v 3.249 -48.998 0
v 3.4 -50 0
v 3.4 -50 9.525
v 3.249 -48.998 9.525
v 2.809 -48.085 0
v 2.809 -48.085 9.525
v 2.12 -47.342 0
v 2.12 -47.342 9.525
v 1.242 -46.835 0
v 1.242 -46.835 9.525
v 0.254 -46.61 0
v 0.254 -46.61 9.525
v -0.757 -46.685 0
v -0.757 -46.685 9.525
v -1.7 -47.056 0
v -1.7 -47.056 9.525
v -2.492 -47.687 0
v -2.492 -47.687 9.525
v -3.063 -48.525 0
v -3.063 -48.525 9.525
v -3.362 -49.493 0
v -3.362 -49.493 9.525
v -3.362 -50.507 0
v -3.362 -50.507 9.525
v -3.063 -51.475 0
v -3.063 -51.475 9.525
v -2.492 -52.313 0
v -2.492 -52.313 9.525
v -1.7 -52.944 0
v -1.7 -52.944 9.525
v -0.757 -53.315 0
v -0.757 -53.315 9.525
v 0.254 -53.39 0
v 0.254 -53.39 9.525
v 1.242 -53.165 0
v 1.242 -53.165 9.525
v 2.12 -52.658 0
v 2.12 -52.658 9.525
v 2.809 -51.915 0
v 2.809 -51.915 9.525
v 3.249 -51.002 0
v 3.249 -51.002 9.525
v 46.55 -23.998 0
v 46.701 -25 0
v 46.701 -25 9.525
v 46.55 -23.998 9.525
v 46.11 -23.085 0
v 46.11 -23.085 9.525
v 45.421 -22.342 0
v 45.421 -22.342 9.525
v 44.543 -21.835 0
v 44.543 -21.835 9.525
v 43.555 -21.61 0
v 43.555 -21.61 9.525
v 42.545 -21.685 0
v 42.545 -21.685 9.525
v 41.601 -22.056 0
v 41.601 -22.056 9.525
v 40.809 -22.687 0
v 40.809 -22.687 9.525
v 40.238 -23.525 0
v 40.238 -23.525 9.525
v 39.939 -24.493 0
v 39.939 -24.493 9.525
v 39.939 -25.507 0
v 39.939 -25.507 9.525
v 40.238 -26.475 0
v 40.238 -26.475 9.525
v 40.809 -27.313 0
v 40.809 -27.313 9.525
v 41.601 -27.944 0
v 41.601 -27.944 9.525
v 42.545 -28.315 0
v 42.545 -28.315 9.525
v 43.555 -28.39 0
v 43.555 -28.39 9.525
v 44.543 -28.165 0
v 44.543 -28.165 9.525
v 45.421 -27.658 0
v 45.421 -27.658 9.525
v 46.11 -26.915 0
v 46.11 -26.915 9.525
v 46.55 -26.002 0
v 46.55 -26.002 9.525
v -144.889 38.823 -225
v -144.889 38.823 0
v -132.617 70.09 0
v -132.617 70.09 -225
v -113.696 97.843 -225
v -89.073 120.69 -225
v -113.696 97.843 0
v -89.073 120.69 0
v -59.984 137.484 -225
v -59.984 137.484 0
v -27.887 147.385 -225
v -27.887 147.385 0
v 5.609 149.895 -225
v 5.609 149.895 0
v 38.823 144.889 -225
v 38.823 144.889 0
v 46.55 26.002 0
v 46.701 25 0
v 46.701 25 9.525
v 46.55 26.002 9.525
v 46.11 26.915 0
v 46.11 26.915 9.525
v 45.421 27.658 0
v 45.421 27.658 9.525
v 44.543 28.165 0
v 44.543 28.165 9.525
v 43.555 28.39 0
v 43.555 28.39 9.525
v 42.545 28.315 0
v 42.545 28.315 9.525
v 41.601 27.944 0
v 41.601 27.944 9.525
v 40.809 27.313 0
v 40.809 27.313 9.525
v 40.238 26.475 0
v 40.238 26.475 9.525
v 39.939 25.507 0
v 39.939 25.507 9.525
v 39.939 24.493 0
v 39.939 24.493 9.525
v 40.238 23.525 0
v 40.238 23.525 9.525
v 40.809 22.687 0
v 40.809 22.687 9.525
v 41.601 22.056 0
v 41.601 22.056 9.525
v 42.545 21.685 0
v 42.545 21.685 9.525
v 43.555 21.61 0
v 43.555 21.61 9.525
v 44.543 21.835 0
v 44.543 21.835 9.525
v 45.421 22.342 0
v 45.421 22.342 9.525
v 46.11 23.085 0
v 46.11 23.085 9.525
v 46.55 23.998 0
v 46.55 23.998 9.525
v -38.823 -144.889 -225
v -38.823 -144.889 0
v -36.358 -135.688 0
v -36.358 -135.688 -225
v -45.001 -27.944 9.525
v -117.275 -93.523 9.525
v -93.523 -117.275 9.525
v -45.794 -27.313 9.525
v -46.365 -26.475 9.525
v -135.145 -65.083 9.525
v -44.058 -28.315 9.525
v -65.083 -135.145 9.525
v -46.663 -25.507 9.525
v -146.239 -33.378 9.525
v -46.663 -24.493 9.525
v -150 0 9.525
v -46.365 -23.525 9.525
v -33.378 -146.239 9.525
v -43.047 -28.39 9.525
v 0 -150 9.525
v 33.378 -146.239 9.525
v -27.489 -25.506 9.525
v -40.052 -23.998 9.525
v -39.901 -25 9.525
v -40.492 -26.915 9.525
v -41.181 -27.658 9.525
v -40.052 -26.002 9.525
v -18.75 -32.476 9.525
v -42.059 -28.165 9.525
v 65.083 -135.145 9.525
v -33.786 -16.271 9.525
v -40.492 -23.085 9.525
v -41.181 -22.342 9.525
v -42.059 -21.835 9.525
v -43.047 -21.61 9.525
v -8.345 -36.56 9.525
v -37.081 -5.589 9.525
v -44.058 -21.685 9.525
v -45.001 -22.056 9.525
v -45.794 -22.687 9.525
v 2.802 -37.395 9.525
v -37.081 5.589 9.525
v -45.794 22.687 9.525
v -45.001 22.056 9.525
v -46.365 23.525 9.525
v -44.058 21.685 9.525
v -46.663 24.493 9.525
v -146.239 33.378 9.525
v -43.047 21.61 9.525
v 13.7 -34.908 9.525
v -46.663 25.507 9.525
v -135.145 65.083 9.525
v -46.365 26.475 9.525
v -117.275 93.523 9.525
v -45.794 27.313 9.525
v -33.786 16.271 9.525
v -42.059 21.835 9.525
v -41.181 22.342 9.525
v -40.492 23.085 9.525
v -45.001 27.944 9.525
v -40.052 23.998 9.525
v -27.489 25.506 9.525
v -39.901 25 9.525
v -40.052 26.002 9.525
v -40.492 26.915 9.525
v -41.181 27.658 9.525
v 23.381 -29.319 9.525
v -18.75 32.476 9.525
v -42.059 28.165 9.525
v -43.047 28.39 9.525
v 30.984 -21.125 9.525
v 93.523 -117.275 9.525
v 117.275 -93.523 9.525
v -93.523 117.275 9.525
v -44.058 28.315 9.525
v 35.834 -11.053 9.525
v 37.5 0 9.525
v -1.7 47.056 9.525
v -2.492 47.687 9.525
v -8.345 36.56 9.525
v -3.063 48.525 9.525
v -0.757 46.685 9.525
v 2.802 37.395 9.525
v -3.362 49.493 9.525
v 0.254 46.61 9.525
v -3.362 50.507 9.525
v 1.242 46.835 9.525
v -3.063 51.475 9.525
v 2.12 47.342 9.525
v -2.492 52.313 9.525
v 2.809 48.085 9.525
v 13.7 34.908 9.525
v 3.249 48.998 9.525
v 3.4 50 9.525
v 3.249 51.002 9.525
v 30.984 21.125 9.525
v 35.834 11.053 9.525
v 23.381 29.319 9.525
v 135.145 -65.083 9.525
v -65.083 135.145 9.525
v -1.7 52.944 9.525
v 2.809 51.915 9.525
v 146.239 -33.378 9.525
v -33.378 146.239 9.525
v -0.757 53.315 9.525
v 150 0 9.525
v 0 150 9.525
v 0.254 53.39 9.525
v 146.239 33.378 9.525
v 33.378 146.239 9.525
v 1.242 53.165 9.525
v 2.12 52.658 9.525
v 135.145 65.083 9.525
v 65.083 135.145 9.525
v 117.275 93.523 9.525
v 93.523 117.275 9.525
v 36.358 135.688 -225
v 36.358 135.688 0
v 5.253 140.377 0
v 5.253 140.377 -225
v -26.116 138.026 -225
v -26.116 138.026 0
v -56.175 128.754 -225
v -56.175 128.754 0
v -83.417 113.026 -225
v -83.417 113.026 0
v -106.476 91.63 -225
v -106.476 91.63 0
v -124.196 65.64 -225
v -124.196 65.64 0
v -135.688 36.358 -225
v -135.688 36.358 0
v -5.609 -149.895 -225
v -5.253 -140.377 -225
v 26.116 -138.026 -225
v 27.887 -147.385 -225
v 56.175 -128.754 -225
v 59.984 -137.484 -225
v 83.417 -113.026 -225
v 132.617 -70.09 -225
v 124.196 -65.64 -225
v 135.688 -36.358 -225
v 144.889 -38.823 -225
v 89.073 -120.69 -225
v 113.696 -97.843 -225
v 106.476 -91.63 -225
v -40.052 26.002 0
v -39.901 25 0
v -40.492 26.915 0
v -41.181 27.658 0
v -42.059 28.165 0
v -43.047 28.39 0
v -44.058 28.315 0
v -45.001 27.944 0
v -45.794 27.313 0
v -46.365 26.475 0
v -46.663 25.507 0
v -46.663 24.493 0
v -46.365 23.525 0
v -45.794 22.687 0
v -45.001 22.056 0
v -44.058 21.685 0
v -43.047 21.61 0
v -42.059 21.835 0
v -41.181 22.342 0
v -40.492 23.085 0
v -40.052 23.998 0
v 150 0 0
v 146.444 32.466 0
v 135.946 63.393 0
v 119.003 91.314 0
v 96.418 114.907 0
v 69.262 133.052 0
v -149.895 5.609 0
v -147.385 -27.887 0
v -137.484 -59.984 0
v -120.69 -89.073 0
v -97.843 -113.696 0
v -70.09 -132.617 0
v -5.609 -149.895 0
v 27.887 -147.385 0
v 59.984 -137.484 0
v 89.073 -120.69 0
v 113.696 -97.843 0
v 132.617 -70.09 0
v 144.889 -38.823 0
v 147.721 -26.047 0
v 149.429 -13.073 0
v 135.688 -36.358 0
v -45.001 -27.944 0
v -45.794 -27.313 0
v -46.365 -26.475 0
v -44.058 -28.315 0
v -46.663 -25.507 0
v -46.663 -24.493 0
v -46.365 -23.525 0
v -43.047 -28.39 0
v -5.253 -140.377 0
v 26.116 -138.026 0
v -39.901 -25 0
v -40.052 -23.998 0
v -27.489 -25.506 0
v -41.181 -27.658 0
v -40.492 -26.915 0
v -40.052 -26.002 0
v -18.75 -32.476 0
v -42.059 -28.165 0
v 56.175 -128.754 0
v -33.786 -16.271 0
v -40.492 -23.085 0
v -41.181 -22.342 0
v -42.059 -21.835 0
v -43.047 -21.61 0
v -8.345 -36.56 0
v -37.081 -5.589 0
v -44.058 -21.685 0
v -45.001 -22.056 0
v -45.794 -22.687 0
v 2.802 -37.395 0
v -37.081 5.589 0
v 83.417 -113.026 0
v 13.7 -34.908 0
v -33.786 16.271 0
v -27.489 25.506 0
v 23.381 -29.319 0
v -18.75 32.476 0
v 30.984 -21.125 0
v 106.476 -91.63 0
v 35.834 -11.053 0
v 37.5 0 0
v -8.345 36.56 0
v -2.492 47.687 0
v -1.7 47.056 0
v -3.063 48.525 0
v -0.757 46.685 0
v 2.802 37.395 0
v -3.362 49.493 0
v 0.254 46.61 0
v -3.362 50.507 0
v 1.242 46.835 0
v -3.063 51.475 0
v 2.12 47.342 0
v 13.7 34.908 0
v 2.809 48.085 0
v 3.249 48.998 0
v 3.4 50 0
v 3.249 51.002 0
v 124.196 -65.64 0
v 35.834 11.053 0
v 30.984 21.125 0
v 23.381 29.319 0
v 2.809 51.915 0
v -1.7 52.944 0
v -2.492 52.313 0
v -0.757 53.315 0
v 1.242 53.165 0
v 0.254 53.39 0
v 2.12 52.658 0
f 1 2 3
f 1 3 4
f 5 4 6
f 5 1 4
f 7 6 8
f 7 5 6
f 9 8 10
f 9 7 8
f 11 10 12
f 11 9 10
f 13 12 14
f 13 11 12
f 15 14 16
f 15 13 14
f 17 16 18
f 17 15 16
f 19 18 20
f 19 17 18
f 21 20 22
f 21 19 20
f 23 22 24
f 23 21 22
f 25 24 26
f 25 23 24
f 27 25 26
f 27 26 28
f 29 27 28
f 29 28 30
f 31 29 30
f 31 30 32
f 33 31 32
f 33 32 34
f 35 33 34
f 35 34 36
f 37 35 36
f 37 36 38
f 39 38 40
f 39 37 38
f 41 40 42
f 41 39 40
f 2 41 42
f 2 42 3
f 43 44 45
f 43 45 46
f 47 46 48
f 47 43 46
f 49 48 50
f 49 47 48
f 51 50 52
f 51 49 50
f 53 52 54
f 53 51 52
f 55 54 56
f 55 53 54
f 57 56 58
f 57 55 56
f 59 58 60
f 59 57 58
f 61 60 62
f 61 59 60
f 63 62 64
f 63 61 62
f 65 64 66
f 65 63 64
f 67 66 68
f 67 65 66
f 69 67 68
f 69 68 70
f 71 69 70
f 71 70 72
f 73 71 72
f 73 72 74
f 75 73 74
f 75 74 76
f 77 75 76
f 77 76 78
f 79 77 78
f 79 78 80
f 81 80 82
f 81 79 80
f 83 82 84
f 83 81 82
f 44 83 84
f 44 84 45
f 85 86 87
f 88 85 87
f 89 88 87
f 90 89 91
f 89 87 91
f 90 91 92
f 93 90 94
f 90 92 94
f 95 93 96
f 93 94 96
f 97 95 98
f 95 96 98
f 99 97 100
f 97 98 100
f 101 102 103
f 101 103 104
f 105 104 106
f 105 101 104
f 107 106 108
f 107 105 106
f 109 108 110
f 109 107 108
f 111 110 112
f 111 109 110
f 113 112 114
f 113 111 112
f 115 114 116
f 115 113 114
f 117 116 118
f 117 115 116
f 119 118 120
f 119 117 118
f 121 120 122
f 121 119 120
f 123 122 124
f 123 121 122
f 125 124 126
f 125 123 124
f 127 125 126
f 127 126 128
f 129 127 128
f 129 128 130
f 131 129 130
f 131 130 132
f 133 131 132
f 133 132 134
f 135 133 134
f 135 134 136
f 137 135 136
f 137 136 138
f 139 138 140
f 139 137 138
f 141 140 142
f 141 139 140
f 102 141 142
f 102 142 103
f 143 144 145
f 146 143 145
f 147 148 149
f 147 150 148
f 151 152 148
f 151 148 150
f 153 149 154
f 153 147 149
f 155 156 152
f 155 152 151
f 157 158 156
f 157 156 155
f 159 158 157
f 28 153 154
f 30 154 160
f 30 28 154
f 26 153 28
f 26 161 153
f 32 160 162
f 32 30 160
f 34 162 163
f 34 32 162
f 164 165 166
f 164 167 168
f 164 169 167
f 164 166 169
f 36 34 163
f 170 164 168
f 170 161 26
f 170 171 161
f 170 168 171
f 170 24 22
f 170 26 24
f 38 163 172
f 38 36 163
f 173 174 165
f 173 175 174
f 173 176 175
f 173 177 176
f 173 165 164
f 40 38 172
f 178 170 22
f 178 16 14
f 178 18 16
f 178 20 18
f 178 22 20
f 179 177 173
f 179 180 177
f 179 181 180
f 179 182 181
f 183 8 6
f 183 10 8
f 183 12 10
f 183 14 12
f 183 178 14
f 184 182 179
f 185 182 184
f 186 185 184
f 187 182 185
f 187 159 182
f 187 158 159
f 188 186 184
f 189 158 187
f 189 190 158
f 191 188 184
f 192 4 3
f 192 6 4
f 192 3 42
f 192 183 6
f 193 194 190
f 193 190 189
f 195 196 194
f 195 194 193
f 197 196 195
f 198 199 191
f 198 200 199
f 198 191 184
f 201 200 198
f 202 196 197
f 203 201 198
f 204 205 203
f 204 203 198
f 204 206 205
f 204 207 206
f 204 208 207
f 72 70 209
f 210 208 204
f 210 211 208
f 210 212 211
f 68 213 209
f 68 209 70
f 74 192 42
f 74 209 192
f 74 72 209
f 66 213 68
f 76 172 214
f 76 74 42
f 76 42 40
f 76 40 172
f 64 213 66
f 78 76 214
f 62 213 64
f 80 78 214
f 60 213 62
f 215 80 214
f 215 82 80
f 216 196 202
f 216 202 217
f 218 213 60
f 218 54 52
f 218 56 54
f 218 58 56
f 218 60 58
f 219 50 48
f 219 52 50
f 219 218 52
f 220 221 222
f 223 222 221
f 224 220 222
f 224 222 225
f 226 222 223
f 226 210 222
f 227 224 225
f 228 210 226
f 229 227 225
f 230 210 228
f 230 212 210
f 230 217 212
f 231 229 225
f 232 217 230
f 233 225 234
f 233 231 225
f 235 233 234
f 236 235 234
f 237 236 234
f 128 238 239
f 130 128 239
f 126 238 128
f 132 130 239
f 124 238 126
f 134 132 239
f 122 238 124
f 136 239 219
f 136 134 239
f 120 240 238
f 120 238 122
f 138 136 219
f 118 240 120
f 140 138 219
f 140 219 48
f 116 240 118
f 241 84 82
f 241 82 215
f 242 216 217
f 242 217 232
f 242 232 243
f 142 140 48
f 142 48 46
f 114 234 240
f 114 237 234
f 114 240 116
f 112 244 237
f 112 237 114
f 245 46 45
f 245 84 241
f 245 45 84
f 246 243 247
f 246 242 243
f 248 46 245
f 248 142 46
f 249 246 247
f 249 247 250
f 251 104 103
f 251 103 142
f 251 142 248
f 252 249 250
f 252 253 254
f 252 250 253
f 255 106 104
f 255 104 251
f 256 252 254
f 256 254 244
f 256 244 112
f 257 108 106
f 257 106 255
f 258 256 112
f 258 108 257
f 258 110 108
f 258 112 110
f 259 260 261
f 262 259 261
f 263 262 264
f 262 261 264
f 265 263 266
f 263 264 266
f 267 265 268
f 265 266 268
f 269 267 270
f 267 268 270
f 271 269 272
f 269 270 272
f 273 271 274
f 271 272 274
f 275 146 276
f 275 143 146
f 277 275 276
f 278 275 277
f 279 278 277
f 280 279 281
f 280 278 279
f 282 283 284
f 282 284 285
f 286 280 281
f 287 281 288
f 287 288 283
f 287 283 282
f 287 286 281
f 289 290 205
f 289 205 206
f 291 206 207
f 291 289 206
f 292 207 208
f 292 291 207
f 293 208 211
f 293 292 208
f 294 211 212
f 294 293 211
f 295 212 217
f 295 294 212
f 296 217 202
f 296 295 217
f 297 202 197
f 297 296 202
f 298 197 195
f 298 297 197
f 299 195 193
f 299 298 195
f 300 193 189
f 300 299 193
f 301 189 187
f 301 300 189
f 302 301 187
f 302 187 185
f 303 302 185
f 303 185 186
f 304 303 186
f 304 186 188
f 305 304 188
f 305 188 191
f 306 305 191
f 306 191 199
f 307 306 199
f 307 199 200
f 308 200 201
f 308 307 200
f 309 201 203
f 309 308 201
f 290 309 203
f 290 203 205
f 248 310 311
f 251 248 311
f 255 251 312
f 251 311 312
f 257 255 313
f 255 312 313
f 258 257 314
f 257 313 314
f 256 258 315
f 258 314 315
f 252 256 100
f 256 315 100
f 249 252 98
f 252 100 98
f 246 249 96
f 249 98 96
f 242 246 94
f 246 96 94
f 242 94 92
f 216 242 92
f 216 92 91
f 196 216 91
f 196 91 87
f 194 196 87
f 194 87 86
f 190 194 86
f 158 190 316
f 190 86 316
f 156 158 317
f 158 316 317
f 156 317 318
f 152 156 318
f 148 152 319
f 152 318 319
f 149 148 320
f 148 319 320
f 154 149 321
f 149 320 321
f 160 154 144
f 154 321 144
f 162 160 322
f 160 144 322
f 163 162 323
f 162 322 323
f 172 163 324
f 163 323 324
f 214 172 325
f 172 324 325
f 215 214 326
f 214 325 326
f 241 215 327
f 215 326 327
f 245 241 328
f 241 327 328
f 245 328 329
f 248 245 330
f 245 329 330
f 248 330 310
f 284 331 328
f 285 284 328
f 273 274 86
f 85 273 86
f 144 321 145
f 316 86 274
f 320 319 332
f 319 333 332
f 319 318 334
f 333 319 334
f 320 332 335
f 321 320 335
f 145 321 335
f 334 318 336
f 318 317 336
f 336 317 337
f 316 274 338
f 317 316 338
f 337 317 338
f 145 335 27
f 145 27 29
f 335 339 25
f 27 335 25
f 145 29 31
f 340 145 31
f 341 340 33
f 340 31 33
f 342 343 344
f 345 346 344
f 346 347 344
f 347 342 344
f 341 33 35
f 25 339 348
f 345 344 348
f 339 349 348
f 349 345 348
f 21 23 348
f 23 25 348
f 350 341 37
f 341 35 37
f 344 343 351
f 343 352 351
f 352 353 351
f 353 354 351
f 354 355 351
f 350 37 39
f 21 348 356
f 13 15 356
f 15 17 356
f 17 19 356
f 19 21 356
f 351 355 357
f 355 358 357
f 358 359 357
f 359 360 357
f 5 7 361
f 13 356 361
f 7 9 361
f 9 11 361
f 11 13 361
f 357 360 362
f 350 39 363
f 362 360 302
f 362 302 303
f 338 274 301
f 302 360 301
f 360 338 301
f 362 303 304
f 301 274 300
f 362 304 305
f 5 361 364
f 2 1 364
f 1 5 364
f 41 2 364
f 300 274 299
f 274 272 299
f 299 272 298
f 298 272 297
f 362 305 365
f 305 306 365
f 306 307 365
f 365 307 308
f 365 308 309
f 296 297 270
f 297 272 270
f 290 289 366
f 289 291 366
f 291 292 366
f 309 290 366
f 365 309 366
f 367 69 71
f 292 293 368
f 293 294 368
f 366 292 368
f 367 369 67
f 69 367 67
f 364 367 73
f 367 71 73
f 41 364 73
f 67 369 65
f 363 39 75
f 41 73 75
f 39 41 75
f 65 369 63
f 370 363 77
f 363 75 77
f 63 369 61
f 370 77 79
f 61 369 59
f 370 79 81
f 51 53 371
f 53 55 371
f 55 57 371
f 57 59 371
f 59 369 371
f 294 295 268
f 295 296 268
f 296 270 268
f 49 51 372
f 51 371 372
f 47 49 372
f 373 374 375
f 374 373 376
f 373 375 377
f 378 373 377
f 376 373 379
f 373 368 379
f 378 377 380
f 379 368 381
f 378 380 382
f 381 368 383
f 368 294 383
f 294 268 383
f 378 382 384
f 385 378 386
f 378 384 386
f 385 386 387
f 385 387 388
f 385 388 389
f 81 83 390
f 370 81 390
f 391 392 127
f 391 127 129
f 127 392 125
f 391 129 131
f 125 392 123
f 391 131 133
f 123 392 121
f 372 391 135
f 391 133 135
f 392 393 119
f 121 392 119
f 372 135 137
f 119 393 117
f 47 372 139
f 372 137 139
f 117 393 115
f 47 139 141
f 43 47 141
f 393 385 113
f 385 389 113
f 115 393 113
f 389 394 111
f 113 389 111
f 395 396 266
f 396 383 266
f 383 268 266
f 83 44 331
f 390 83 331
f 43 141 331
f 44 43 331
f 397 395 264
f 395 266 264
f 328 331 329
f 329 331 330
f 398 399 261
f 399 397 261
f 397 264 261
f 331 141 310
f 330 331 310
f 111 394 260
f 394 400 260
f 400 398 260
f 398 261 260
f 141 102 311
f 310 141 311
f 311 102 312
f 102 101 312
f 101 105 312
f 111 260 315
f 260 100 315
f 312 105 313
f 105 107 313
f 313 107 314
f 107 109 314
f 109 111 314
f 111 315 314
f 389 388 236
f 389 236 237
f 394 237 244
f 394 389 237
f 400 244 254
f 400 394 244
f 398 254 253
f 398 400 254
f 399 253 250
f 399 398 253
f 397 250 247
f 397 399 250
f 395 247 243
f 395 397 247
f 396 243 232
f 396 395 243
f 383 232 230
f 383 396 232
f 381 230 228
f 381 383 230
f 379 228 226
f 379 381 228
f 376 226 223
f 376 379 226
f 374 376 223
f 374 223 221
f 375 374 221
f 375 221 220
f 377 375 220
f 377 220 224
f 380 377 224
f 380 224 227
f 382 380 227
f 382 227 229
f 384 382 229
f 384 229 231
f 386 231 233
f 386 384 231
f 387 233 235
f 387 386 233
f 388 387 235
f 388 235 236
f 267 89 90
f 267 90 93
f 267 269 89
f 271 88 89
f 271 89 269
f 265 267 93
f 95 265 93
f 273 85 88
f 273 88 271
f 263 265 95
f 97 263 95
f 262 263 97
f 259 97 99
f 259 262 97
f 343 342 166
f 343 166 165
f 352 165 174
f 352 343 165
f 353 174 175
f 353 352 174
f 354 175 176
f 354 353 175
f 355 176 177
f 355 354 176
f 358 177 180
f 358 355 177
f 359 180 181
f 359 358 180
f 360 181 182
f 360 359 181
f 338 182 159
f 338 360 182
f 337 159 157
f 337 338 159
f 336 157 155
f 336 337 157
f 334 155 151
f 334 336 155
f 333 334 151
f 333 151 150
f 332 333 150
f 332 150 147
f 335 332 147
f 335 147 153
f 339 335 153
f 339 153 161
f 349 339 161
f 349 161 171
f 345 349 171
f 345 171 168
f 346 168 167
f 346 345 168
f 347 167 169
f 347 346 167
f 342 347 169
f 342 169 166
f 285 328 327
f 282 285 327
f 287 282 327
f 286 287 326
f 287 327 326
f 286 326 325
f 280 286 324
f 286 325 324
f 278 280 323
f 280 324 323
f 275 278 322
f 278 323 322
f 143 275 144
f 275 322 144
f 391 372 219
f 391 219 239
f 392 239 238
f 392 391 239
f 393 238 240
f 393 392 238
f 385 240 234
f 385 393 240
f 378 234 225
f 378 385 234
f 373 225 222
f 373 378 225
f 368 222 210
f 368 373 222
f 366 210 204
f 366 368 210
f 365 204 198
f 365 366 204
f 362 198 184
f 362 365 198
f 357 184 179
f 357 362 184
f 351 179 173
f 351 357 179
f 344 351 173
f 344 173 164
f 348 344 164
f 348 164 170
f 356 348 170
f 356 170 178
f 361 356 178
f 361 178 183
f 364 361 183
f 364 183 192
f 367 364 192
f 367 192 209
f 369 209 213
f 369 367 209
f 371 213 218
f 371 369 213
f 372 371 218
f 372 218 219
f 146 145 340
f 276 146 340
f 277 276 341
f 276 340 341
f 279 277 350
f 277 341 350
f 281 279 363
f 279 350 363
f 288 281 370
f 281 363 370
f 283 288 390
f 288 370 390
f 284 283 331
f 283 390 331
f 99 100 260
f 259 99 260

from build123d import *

# Parameters (mm, degrees)
F0_R     = 150
F0_R_2   = 3.4
F0_R_3   = 37.5
F1_DEPTH = 9.525
F3_DEPTH = 225


# Not quite as in the source:
# - a length typed as a fraction of an inch, garbled in the dataset ("3 / 203.2 mm" for 3/8 in), is restored


with BuildPart() as f1:
    # F0 (on Top) → F1 (new body)
    with BuildSketch(Plane.XY):
        Circle(F0_R)
        with Locations((-43.3012701892, -25)):
            Circle(F0_R_2, mode=Mode.SUBTRACT)
        with Locations((0, -50)):
            Circle(F0_R_2, mode=Mode.SUBTRACT)
        with Locations((43.3012701892, -25)):
            Circle(F0_R_2, mode=Mode.SUBTRACT)
        with Locations((-43.3012701892, 25)):
            Circle(F0_R_2, mode=Mode.SUBTRACT)
        Circle(F0_R_3, mode=Mode.SUBTRACT)
        with Locations((43.3012701892, 25)):
            Circle(F0_R_2, mode=Mode.SUBTRACT)
        with Locations((0, 50)):
            Circle(F0_R_2, mode=Mode.SUBTRACT)
    extrude(amount=F1_DEPTH)

    # F2 (on face) → F3 (join)
    with BuildSketch(Plane(origin=(0, 0, 0), x_dir=(1, 0, 0), z_dir=(0, 0, -1))):
        with BuildLine():
            Line((-135.688430448, -36.3576053608), (-144.8888739434, -38.8228567654))
            ThreePointArc((-144.8888739434, -38.8228567654), (-75, -129.9038105677), (38.8228567654, -144.8888739434))
            Line((38.8228567654, -144.8888739434), (36.3576053608, -135.688430448))
            ThreePointArc((36.3576053608, -135.688430448), (-70.2375, -121.6549185966), (-135.688430448, -36.3576053608))
        make_face()
        with BuildLine():
            ThreePointArc((-36.3576053608, 135.688430448), (70.2375, 121.6549185966), (135.688430448, 36.3576053608))
            Line((135.688430448, 36.3576053608), (144.8888739434, 38.8228567654))
            ThreePointArc((144.8888739434, 38.8228567654), (75, 129.9038105677), (-38.8228567654, 144.8888739434))
            Line((-38.8228567654, 144.8888739434), (-36.3576053608, 135.688430448))
        make_face()
    extrude(amount=F3_DEPTH)


solid = f1.part
